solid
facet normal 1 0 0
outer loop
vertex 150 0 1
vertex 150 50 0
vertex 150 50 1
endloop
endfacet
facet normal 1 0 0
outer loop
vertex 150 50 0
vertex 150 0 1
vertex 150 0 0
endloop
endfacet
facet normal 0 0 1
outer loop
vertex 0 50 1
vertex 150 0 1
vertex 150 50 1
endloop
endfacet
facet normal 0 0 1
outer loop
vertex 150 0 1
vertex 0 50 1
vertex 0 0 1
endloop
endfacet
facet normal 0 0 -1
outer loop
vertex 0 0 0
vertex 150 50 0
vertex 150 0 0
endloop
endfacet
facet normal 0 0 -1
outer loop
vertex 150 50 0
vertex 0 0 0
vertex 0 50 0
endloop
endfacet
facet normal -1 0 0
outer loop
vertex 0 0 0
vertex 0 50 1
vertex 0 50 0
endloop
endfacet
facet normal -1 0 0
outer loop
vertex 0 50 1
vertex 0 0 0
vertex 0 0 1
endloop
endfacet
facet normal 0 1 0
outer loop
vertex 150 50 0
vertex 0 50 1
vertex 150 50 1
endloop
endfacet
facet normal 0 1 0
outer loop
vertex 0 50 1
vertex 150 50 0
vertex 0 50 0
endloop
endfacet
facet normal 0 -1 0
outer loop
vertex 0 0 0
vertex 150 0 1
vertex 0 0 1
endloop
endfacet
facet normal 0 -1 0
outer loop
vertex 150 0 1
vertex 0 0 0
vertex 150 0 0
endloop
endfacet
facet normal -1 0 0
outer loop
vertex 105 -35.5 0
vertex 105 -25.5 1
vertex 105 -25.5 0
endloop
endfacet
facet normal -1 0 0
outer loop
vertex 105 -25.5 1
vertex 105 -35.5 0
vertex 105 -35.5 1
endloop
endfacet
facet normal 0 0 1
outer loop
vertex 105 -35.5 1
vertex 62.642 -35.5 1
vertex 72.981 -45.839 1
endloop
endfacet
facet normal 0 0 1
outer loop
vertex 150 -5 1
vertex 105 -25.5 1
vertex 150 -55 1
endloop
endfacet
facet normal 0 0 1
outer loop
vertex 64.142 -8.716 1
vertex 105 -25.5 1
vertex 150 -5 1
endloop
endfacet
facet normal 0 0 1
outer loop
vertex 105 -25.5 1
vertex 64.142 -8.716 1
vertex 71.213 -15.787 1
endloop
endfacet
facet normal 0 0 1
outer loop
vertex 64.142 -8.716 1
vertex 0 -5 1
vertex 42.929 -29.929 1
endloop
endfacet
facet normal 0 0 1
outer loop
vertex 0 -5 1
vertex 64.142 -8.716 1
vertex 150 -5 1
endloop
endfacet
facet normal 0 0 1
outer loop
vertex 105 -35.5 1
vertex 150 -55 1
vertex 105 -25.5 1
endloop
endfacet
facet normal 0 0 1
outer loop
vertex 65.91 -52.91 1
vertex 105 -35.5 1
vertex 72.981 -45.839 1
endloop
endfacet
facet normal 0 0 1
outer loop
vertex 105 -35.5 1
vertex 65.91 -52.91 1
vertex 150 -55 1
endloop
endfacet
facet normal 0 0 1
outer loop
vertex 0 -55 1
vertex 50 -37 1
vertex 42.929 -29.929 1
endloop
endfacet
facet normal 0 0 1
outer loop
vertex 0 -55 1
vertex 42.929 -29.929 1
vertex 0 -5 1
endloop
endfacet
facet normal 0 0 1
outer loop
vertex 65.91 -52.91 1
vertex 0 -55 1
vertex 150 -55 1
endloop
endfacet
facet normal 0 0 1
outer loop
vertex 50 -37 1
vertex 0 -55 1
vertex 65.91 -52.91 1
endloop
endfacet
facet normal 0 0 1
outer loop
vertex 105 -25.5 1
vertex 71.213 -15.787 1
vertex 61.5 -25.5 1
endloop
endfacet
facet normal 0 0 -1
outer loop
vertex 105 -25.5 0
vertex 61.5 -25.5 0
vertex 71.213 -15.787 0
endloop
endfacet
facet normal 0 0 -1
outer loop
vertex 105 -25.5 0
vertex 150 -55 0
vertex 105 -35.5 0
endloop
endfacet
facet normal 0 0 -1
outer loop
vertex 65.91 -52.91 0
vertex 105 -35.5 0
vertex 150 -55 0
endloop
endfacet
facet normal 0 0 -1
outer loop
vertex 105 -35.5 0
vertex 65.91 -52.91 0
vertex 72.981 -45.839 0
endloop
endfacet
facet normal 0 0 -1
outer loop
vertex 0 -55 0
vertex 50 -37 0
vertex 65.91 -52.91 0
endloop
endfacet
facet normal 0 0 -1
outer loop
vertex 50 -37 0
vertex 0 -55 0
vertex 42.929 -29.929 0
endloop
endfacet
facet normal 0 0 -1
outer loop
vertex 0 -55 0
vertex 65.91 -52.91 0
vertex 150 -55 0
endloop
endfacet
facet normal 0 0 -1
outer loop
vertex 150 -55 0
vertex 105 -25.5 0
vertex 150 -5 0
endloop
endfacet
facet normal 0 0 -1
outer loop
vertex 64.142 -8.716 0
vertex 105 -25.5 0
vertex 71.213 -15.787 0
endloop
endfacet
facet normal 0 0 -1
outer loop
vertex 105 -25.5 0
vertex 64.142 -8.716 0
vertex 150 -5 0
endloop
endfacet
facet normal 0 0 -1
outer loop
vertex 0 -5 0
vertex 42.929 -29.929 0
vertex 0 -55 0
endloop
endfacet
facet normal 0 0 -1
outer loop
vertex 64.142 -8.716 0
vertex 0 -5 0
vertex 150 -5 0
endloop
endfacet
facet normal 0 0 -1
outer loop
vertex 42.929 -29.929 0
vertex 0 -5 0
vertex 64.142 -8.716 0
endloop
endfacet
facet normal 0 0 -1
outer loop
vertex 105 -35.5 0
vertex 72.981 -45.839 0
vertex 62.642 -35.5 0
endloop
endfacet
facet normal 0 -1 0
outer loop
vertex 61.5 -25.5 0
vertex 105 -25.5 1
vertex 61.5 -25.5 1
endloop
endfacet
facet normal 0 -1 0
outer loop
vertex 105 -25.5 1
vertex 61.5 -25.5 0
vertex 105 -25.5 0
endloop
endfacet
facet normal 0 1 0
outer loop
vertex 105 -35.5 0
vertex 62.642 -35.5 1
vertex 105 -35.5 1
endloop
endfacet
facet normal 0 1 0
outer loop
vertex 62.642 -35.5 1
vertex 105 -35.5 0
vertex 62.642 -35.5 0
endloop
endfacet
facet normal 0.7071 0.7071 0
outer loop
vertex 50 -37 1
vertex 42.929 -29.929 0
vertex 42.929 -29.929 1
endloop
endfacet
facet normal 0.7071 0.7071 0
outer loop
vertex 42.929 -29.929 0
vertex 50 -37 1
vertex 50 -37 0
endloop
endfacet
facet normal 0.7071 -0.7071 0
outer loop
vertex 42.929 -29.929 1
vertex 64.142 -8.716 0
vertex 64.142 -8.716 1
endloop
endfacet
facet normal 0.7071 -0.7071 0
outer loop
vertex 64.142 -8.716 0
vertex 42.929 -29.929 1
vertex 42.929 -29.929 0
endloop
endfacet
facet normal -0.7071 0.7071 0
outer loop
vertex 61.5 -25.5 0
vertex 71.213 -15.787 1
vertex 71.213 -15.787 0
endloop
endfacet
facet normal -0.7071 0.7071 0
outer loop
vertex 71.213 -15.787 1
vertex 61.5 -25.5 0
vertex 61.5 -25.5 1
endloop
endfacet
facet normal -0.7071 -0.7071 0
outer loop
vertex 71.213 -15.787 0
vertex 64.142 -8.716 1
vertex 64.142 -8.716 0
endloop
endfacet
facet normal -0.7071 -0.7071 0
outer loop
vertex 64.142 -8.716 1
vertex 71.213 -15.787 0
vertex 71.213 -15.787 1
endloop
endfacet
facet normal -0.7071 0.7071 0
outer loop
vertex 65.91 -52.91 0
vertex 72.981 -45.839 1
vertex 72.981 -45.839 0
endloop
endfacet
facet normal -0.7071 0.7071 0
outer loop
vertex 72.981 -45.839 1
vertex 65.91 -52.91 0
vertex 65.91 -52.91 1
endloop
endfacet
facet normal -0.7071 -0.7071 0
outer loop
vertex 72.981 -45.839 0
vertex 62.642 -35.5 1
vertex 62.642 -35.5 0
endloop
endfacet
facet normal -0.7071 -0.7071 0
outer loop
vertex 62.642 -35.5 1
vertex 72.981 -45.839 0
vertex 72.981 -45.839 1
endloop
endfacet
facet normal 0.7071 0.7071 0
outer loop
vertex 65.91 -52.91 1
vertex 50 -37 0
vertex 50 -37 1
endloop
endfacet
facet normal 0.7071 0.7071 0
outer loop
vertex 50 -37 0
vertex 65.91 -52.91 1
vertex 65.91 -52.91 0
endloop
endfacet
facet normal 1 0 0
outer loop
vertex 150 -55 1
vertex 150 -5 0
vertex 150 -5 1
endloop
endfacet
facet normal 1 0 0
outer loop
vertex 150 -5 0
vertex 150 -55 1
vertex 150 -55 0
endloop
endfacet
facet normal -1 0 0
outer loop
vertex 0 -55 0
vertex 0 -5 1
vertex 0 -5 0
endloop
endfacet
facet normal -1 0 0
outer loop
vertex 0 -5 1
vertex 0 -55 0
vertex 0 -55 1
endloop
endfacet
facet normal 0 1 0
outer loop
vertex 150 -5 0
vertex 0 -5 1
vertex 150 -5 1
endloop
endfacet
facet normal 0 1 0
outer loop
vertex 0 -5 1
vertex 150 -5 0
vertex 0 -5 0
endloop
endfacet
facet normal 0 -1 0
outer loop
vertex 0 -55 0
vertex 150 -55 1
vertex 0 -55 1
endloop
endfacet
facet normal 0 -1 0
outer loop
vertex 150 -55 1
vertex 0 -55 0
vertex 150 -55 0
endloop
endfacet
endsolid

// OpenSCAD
// file: atoi.scad
function atoi(a)=
(a=="!")?33:
(a=="\"")?34:
(a=="#")?35:
(a=="$")?36:
(a=="%")?37:
(a=="&")?38:
(a=="'")?39:
(a=="(")?40:
(a==")")?41:
(a=="*")?42:
(a=="+")?43:
(a==",")?44:
(a=="-")?45:
(a==".")?46:
(a=="/")?47:
(a=="0")?48:
(a=="1")?49:
(a=="2")?50:
(a=="3")?51:
(a=="4")?52:
(a=="5")?53:
(a=="6")?54:
(a=="7")?55:
(a=="8")?56:
(a=="9")?57:
(a==":")?58:
(a==";")?59:
(a=="<")?60:
(a=="=")?61:
(a==">")?62:
(a=="?")?63:
(a=="@")?64:
(a=="A")?65:
(a=="B")?66:
(a=="C")?67:
(a=="D")?68:
(a=="E")?69:
(a=="F")?70:
(a=="G")?71:
(a=="H")?72:
(a=="I")?73:
(a=="J")?74:
(a=="K")?75:
(a=="L")?76:
(a=="M")?77:
(a=="N")?78:
(a=="O")?79:
(a=="P")?80:
(a=="Q")?81:
(a=="R")?82:
(a=="S")?83:
(a=="T")?84:
(a=="U")?85:
(a=="V")?86:
(a=="W")?87:
(a=="X")?88:
(a=="Y")?89:
(a=="Z")?90:
(a=="[")?91:
(a=="\\")?92:
(a=="]")?93:
(a=="^")?94:
(a=="_")?95:
(a=="`")?96:
(a=="a")?97:
(a=="b")?98:
(a=="c")?99:
(a=="d")?100:
(a=="e")?101:
(a=="f")?102:
(a=="g")?103:
(a=="h")?104:
(a=="i")?105:
(a=="j")?106:
(a=="k")?107:
(a=="l")?108:
(a=="m")?109:
(a=="n")?110:
(a=="o")?111:
(a=="p")?112:
(a=="q")?113:
(a=="r")?114:
(a=="s")?115:
(a=="t")?116:
(a=="u")?117:
(a=="v")?118:
(a=="w")?119:
(a=="x")?120:
(a=="y")?121:
(a=="z")?122:
(a=="{")?123:
(a=="|")?124:
(a=="}")?125:
(a=="~")?126:
(a=="€")?128:
(a=="‚")?130:
(a=="ƒ")?131:
(a=="„")?132:
(a=="…")?133:
(a=="†")?134:
(a=="‡")?135:
(a=="ˆ")?136:
(a=="‰")?137:
(a=="Š")?138:
(a=="‹")?139:
(a=="Œ")?140:
(a=="Ž")?142:
(a=="‘")?145:
(a=="’")?146:
(a=="“")?147:
(a=="”")?148:
(a=="•")?149:
(a=="–")?150:
(a=="—")?151:
(a=="˜")?152:
(a=="™")?153:
(a=="š")?154:
(a=="›")?155:
(a=="œ")?156:
(a=="ž")?158:
(a=="Ÿ")?159:
(a=="¡")?161:
(a=="¢")?162:
(a=="£")?163:
(a=="¤")?164:
(a=="¥")?165:
(a=="¦")?166:
(a=="§")?167:
(a=="¨")?168:
(a=="©")?169:
(a=="ª")?170:
(a=="«")?171:
(a=="¬")?172:
(a=="®")?174:
(a=="¯")?175:
(a=="°")?176:
(a=="±")?177:
(a=="²")?178:
(a=="³")?179:
(a=="´")?180:
(a=="µ")?181:
(a=="¶")?182:
(a=="·")?183:
(a=="¸")?184:
(a=="¹")?185:
(a=="º")?186:
(a=="»")?187:
(a=="¼")?188:
(a=="½")?189:
(a=="¾")?190:
(a=="¿")?191:
(a=="À")?192:
(a=="Á")?193:
(a=="Â")?194:
(a=="Ã")?195:
(a=="Ä")?196:
(a=="Å")?197:
(a=="Æ")?198:
(a=="Ç")?199:
(a=="È")?200:
(a=="É")?201:
(a=="Ê")?202:
(a=="Ë")?203:
(a=="Ì")?204:
(a=="Í")?205:
(a=="Î")?206:
(a=="Ï")?207:
(a=="Ð")?208:
(a=="Ñ")?209:
(a=="Ò")?210:
(a=="Ó")?211:
(a=="Ô")?212:
(a=="Õ")?213:
(a=="Ö")?214:
(a=="×")?215:
(a=="Ø")?216:
(a=="Ù")?217:
(a=="Ú")?218:
(a=="Û")?219:
(a=="Ü")?220:
(a=="Ý")?221:
(a=="Þ")?222:
(a=="ß")?223:
(a=="à")?224:
(a=="á")?225:
(a=="â")?226:
(a=="ã")?227:
(a=="ä")?228:
(a=="å")?229:
(a=="æ")?230:
(a=="ç")?231:
(a=="è")?232:
(a=="é")?233:
(a=="ê")?234:
(a=="ë")?235:
(a=="ì")?236:
(a=="í")?237:
(a=="î")?238:
(a=="ï")?239:
(a=="ð")?240:
(a=="ñ")?241:
(a=="ò")?242:
(a=="ó")?243:
(a=="ô")?244:
(a=="õ")?245:
(a=="ö")?246:
(a=="÷")?247:
(a=="ø")?248:
(a=="ù")?249:
(a=="ú")?250:
(a=="û")?251:
(a=="ü")?252:
(a=="ý")?253:
(a=="þ")?254:
(a=="ÿ")?255:
0;
// file: write.scad
include <atoi.scad>;
module _write(font,s,h,p,i) {
	if(i<len(s)){
		if(s[i]==" "){
			translate([dxf_dim(file = font, name = str(atoi("-"),"_width")),0,0])
				_write(font,s,h,p,i+1);
		}else{
			linear_extrude(height=h) import(font,layer=atoi(s[i]));		
			translate([p+dxf_dim(file = font, name = str(atoi(s[i]),"_width")),0,0])
				_write(font,s,h,p,i+1);
		}
	}
}
module write(s,h,p){
	_write("GaroaHackerClubeBold.dxf",s,h,1,0);
}
module write_custom(font,s,h,p){
	_write(font,s,h,p,0);
}
// main file
use <write.scad>
f="stencil.dxf";

difference()
{
cube([150,50,1]);
 translate([30,20,0]) resize([100,12,8]) write("HEAVY END",[0,0,0],20,font=f,space=2,t=2);
}

difference()
{
	translate([0,-55,0]) cube([150,50,1]);
	translate([50,18,0]) union()
	{
		translate([5,-53.5,0]) cube([50,10,1]);
		translate([0,-55,0]) rotate(a=45) cube([30,10,1]);
		translate([0,-55,0]) rotate(a=-45) cube([22.5,10,1]);
	}
}
